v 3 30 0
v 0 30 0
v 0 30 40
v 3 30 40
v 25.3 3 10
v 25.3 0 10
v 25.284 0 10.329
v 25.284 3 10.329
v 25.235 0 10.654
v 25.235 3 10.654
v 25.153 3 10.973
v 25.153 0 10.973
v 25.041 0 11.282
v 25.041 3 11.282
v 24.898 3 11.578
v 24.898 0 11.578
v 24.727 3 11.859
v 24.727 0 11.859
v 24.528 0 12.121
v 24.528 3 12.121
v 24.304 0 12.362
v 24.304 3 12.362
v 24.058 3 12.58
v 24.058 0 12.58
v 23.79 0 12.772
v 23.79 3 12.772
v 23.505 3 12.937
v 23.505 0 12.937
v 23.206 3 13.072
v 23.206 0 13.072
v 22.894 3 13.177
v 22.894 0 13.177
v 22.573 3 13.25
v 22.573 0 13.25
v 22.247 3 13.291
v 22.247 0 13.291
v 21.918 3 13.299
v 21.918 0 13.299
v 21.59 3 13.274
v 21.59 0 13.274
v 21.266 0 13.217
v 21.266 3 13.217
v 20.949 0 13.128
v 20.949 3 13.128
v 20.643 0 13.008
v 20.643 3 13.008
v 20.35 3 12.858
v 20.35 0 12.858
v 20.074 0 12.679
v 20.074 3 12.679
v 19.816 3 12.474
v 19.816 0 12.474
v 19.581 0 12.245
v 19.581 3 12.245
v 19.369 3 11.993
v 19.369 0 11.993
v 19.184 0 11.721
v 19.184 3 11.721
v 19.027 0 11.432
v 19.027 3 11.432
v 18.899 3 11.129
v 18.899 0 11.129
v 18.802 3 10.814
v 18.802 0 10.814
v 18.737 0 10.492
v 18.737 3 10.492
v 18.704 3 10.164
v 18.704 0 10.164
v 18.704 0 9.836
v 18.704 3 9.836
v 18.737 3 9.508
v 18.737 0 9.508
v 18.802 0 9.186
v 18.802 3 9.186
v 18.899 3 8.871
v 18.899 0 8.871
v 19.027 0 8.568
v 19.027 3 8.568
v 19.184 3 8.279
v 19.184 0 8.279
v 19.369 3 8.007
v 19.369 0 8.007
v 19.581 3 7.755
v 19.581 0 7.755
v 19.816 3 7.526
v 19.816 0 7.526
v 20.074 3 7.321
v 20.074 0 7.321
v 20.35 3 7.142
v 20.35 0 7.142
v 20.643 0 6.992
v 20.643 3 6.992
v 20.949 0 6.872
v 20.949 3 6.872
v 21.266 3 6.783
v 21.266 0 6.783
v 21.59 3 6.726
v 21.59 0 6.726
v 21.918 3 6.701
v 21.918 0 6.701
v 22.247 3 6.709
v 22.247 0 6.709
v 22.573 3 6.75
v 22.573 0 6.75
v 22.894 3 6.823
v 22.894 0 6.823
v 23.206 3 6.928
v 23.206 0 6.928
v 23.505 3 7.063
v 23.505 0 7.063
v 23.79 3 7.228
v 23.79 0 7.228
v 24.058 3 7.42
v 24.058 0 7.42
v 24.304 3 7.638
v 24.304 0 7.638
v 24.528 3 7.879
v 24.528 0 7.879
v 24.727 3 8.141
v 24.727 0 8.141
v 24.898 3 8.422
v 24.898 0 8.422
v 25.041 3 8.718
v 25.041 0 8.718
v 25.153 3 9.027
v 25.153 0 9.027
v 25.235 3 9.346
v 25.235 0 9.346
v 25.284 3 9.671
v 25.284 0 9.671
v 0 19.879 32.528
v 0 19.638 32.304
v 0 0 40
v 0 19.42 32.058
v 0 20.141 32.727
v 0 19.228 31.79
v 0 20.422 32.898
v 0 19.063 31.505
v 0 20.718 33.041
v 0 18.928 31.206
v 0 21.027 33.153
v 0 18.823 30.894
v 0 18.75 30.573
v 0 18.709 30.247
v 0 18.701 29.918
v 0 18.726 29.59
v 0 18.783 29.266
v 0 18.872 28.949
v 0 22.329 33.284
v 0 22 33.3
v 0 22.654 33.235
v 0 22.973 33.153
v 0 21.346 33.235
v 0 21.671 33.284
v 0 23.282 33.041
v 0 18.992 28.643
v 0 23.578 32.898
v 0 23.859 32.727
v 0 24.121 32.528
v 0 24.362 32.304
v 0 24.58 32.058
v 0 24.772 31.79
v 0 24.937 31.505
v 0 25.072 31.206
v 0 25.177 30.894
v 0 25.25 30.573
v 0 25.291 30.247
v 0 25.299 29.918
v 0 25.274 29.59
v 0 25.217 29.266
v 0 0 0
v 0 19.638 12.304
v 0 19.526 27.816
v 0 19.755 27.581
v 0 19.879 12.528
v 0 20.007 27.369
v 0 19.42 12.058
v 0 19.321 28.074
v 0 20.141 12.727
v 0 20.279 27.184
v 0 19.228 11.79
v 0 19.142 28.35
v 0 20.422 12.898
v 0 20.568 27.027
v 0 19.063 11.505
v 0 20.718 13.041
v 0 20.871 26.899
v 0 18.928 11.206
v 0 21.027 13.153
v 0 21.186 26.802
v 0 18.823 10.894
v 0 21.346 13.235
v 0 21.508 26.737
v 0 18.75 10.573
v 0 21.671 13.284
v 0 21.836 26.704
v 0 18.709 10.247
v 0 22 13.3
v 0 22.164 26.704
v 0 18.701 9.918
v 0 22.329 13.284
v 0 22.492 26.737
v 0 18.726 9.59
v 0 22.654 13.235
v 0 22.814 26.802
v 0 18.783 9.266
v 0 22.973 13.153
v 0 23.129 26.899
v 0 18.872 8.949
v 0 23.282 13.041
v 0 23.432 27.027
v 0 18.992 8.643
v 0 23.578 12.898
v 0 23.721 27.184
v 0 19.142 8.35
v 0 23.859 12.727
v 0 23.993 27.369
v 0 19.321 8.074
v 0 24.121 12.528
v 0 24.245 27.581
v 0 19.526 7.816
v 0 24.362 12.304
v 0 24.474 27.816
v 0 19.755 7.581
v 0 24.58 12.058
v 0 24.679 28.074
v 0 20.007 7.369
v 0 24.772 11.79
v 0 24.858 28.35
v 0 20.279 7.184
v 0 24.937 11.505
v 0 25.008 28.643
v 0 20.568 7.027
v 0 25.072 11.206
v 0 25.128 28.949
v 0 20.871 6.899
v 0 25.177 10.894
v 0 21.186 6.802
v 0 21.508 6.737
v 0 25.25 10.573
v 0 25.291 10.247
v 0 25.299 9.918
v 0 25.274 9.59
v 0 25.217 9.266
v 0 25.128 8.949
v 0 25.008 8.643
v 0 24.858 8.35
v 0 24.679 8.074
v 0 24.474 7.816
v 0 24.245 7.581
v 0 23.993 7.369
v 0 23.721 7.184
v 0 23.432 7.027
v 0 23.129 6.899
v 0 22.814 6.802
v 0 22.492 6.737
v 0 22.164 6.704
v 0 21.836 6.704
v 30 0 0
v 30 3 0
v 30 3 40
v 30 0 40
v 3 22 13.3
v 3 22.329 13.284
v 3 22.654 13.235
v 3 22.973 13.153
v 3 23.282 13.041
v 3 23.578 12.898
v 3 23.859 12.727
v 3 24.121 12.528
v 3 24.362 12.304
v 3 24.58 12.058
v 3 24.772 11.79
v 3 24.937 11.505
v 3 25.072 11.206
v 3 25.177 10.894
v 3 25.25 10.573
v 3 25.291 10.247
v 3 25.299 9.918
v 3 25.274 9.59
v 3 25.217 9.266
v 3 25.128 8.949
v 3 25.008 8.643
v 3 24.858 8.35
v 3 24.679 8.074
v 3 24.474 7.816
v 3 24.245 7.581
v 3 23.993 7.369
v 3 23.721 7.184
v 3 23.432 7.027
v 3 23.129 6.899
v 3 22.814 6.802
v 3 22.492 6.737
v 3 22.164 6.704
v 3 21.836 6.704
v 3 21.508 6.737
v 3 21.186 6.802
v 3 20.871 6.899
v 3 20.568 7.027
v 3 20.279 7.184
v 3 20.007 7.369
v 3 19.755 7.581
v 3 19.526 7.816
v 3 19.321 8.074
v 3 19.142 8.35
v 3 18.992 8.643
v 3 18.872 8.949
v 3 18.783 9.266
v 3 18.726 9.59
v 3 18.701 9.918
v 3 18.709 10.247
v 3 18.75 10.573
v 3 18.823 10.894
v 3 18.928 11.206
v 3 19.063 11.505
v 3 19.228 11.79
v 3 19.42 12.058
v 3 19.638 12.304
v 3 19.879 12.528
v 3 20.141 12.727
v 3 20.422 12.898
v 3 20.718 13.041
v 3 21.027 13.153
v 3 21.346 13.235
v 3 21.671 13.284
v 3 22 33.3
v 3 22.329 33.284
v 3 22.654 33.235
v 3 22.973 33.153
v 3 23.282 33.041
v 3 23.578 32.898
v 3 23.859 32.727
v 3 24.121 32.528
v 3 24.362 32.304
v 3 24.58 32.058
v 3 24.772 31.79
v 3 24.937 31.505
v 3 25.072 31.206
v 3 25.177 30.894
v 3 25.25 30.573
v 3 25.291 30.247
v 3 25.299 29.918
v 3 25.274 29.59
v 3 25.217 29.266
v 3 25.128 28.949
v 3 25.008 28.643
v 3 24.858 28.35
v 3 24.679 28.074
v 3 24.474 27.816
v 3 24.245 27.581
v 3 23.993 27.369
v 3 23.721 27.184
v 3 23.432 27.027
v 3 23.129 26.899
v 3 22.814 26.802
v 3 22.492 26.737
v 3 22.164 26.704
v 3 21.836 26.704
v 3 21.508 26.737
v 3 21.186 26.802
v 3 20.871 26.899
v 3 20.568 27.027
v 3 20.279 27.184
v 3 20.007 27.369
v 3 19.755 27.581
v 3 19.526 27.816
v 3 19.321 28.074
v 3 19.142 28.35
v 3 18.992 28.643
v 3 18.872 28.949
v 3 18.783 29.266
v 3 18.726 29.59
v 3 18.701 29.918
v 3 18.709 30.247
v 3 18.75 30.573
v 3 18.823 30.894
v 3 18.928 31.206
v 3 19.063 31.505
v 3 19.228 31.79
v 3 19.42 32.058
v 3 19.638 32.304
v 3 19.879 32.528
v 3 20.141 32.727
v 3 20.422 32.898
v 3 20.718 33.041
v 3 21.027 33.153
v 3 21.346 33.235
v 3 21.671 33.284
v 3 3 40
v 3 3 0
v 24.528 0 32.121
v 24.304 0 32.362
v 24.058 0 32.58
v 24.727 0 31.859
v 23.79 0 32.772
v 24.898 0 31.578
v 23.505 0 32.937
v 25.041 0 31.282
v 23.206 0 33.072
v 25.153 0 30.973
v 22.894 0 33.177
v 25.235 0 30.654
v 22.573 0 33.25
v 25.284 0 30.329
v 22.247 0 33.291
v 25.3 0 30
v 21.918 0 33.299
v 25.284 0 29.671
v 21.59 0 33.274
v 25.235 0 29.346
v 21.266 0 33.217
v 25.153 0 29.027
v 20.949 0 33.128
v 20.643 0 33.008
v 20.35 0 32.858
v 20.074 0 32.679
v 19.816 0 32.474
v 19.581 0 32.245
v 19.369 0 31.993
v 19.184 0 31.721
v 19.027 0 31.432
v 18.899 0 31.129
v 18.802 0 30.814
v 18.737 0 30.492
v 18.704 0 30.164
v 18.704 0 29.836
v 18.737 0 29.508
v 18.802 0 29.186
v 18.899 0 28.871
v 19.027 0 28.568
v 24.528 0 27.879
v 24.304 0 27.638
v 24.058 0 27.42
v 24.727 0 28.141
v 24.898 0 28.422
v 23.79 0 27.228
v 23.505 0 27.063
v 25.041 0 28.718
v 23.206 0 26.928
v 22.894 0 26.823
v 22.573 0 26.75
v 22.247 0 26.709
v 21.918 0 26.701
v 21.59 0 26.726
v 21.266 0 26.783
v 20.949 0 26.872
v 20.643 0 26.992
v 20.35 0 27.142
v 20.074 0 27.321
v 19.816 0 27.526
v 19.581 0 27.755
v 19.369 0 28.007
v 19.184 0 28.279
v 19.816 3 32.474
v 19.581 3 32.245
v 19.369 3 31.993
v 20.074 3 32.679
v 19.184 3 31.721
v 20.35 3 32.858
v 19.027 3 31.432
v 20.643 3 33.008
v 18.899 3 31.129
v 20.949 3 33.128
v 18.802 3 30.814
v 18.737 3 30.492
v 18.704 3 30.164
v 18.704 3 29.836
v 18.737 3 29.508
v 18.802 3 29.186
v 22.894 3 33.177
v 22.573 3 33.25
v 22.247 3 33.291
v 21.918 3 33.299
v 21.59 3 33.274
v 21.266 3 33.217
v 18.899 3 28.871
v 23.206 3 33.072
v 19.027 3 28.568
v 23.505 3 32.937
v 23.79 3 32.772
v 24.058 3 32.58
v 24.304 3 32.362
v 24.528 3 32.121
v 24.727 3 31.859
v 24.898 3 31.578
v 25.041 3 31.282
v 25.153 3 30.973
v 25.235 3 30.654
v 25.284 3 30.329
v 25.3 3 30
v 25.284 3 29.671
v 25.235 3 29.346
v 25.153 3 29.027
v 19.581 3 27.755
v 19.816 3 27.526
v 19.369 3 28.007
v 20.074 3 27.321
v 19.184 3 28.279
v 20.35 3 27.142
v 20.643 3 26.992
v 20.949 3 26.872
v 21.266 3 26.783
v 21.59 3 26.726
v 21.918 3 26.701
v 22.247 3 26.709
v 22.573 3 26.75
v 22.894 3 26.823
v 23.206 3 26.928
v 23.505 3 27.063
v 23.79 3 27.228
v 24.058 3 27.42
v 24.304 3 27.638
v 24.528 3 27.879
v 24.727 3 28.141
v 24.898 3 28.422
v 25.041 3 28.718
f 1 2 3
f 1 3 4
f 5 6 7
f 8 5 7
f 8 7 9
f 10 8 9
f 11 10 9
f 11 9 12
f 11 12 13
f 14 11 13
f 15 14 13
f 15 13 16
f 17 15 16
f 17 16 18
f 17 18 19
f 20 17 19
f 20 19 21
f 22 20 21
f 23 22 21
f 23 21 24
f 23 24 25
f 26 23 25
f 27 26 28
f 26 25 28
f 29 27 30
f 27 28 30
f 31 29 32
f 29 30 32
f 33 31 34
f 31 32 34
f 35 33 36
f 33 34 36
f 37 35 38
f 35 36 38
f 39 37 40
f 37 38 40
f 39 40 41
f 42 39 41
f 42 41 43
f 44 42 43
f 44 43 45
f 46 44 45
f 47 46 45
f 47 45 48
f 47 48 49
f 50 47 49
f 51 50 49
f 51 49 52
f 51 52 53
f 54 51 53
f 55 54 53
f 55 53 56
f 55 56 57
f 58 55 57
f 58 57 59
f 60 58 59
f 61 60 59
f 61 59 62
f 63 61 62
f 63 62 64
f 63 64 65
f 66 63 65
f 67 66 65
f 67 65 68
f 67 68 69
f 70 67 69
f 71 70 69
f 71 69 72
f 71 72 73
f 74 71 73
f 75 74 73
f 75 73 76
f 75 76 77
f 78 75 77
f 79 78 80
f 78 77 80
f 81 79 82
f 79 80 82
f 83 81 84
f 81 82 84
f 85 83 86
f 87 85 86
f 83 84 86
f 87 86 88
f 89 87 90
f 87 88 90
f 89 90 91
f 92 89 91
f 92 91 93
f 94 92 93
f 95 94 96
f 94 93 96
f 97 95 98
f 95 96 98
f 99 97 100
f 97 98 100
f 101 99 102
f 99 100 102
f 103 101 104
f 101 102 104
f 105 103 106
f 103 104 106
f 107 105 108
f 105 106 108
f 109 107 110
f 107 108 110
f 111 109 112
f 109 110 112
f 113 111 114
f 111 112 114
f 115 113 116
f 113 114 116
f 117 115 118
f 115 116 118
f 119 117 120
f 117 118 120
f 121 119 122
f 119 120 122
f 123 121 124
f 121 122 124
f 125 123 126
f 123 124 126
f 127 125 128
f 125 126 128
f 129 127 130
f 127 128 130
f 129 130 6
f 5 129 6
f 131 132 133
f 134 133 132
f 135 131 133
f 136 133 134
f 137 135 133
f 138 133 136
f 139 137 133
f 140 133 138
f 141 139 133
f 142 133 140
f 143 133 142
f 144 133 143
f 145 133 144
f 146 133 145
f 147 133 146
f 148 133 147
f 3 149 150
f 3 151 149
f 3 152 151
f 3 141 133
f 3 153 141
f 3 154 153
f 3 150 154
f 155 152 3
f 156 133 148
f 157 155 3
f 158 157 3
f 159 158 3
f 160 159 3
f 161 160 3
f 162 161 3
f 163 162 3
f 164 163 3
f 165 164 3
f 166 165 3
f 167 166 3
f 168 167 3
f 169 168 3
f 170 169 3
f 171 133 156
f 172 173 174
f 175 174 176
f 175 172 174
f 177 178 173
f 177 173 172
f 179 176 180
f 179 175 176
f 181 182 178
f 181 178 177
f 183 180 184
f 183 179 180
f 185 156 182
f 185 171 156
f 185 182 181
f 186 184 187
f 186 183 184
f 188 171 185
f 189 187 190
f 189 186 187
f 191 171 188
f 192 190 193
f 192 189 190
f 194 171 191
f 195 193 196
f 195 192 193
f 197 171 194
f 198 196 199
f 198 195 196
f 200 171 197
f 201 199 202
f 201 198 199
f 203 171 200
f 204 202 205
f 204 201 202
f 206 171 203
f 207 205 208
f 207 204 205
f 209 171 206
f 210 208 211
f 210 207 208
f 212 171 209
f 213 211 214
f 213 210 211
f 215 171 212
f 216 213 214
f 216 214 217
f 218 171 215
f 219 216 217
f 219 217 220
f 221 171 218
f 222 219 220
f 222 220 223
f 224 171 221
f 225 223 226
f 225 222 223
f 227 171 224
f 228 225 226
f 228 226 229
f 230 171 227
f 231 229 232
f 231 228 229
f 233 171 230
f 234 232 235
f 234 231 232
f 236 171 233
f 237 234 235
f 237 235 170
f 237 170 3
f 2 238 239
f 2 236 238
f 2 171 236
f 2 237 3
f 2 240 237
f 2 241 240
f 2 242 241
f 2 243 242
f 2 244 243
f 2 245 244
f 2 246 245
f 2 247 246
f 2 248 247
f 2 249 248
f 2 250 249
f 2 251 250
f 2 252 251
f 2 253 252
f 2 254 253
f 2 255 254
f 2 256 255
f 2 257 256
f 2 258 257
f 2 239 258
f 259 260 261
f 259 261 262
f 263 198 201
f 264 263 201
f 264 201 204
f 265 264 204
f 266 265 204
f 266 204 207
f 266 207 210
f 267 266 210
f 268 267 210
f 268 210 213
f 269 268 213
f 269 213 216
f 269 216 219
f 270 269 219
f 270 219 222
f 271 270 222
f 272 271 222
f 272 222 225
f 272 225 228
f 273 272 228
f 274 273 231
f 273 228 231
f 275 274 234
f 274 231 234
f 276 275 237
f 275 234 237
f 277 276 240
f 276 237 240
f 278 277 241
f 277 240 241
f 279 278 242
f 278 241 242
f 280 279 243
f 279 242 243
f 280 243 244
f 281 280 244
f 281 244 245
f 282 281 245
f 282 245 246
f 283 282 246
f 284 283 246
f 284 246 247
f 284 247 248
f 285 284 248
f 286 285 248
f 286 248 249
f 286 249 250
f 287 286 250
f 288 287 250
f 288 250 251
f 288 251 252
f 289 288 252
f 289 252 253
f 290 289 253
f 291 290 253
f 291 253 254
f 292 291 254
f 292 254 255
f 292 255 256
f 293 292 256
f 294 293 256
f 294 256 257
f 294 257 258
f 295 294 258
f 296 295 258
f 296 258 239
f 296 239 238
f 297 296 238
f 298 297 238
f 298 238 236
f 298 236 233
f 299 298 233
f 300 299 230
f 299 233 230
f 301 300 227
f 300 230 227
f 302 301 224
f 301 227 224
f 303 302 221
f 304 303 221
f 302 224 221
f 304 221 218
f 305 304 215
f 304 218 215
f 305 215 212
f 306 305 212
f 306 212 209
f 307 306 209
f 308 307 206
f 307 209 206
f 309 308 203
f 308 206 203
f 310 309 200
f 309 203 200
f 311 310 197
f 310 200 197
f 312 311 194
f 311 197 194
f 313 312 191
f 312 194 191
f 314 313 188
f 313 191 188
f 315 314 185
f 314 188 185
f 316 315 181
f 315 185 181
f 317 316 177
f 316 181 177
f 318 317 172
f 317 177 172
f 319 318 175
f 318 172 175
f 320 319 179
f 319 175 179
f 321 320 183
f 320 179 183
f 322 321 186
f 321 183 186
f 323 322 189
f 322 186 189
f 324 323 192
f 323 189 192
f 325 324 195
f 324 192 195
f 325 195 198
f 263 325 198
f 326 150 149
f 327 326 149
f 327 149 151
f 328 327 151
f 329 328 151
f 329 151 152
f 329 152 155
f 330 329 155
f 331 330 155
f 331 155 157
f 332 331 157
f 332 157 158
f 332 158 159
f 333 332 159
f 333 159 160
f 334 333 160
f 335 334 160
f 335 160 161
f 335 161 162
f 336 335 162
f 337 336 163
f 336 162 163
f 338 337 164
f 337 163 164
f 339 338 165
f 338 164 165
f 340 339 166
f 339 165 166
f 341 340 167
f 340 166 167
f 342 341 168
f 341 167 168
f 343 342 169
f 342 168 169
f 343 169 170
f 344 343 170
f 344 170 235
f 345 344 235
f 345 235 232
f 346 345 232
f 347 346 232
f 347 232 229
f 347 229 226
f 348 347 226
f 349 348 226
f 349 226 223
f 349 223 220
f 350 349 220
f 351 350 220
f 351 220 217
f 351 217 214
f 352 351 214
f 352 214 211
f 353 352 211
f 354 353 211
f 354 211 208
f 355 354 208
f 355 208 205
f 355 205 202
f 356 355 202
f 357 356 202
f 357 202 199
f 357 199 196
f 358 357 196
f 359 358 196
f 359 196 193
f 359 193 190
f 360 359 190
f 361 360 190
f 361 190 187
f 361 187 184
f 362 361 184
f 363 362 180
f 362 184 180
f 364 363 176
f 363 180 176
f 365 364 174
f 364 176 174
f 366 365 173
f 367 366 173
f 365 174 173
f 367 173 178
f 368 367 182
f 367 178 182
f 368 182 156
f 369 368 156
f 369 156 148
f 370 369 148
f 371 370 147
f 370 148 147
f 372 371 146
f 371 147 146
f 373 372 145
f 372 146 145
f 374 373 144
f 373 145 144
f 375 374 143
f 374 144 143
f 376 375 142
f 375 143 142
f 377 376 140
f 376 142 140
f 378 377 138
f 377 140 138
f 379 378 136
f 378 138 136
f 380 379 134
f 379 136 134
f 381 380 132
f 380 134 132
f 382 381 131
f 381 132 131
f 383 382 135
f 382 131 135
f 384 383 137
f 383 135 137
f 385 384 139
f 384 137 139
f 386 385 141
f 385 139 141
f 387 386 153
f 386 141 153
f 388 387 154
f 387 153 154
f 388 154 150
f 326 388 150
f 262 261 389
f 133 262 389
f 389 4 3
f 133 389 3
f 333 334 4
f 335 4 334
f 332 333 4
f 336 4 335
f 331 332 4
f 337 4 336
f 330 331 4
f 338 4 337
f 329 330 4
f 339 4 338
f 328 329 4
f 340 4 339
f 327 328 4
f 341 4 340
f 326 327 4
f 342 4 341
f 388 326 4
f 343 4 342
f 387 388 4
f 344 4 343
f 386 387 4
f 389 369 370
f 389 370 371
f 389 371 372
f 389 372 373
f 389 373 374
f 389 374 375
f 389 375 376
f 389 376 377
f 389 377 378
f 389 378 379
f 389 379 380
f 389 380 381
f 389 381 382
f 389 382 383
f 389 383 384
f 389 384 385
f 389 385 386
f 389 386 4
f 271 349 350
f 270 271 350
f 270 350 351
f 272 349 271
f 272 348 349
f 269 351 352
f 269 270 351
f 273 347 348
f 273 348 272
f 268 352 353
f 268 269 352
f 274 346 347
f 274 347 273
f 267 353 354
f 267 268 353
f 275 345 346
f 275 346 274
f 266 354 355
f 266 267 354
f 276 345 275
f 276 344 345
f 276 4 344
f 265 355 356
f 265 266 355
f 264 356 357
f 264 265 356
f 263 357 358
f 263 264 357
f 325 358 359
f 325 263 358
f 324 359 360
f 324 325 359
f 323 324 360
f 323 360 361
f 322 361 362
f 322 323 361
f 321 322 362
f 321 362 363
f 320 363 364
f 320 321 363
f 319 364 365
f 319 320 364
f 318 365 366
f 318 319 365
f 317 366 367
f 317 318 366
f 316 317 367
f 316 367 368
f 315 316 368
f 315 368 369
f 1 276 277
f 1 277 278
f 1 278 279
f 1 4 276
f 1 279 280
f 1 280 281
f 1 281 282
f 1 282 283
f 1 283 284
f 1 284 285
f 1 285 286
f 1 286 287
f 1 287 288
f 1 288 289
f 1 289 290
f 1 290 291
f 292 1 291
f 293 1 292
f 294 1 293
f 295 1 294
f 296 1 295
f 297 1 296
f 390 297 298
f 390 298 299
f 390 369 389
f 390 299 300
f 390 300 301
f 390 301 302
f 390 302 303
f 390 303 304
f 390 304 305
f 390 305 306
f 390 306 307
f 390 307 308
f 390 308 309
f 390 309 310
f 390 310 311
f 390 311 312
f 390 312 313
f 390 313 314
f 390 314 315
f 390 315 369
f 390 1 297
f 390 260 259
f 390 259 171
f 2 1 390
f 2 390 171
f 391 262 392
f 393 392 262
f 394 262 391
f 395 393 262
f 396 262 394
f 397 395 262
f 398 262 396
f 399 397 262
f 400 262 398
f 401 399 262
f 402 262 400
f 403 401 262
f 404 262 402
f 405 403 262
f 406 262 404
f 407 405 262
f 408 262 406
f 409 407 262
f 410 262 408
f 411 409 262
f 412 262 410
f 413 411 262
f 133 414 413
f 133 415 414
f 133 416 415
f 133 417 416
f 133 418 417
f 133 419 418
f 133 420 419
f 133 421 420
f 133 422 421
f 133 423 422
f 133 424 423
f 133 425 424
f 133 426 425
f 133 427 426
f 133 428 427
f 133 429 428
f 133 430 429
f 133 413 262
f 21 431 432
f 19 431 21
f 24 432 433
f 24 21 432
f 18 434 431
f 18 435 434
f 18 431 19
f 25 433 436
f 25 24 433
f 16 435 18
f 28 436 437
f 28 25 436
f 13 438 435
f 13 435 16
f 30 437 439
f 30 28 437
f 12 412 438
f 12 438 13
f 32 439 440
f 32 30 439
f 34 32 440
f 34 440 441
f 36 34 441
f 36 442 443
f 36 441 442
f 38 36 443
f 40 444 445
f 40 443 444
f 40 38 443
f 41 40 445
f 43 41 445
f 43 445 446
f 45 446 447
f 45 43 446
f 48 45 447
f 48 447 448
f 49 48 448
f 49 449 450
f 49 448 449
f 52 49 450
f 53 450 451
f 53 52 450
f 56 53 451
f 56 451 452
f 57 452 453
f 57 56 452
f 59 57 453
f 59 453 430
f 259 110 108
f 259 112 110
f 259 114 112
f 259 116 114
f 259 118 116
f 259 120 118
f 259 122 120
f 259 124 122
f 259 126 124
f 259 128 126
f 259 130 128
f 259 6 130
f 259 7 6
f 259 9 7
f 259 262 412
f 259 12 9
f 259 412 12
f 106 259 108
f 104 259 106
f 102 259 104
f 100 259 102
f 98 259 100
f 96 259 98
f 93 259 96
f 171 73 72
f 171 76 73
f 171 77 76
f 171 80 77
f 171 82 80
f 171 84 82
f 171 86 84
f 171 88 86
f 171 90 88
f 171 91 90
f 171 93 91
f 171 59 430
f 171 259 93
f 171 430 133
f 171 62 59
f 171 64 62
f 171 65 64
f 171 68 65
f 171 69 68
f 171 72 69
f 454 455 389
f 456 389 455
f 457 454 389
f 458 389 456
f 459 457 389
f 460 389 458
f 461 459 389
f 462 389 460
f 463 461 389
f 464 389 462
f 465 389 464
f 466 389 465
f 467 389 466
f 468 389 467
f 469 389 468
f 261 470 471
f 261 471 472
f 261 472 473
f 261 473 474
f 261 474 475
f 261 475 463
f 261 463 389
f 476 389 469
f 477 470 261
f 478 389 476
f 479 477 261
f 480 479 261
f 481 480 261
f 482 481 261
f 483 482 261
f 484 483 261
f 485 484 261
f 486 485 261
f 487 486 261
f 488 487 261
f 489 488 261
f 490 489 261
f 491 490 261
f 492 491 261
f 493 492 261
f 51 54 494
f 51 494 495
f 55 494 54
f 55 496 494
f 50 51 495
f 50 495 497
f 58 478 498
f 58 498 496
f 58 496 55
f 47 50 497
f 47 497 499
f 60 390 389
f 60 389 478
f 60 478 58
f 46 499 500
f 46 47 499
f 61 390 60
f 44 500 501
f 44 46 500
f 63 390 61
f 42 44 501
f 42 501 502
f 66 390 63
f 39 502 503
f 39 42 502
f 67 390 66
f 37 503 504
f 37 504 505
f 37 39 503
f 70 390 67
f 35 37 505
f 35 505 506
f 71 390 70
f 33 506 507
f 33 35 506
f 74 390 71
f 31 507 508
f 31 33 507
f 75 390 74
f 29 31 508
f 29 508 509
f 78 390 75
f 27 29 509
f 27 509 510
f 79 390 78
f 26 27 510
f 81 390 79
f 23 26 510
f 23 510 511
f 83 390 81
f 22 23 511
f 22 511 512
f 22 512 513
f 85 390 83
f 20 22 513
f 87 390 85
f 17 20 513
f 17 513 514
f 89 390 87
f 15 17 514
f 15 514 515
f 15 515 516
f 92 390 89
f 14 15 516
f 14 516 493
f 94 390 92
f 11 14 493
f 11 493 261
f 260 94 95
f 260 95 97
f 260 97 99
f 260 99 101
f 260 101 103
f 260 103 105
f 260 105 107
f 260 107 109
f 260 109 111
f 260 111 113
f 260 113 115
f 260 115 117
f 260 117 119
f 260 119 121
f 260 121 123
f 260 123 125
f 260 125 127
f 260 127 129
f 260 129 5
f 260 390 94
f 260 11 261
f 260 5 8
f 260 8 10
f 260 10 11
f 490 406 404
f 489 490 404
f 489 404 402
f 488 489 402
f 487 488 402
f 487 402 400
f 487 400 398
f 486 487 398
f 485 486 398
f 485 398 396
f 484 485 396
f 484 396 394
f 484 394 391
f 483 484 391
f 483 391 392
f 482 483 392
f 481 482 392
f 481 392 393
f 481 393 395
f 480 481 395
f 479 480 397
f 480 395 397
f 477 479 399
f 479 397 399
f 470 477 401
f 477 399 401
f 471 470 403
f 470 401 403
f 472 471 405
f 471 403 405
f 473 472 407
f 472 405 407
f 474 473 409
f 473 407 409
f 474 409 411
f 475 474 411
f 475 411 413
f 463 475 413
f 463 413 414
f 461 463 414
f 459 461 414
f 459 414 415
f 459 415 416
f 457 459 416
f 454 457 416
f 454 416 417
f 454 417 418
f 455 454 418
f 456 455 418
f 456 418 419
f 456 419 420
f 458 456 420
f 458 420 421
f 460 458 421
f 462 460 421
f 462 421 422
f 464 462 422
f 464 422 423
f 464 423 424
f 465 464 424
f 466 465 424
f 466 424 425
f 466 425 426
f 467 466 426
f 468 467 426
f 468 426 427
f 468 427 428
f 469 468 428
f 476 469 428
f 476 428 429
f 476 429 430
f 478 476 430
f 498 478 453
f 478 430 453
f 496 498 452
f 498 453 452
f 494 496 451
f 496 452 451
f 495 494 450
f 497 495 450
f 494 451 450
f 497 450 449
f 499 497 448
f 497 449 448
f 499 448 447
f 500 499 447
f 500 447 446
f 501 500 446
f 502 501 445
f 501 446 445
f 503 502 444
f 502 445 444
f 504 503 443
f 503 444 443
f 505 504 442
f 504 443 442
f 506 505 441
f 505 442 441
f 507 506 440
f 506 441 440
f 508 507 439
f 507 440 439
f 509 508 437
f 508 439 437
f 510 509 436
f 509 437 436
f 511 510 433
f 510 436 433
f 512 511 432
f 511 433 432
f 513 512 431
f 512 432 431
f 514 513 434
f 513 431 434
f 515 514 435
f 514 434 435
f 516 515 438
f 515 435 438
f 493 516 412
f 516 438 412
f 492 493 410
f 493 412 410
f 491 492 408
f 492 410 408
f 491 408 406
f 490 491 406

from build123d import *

# Parameters (mm, degrees)
EXTRUDE_1_DEPTH     = 40
SKETCH_2_R          = 3.3
CUT_EXTRUDE_1_DEPTH = 40
SKETCH_3_R          = 3.3
CUT_EXTRUDE_2_DEPTH = 40


with BuildPart() as part:
    # 草图1 → 凸台-拉伸1 (new body)
    with BuildSketch(Plane.XY):
        Polygon((0, 0), (0, 30), (3, 30), (3, 3), (30, 3), (30, 0), align=None)
    extrude(amount=EXTRUDE_1_DEPTH)

    # 草图2 → 切除-拉伸1 (cut)
    with BuildSketch(Plane.ZY):
        with Locations((10, 22)):
            Circle(SKETCH_2_R)
        with Locations((30, 22)):
            Circle(SKETCH_2_R)
    extrude(amount=-CUT_EXTRUDE_1_DEPTH, mode=Mode.SUBTRACT)

    # 草图3 → 切除-拉伸2 (cut)
    with BuildSketch(Plane.XZ):
        with Locations((22, 30)):
            Circle(SKETCH_3_R)
        with Locations((22, 10)):
            Circle(SKETCH_3_R)
    extrude(amount=-CUT_EXTRUDE_2_DEPTH, mode=Mode.SUBTRACT)


solid = part.part
